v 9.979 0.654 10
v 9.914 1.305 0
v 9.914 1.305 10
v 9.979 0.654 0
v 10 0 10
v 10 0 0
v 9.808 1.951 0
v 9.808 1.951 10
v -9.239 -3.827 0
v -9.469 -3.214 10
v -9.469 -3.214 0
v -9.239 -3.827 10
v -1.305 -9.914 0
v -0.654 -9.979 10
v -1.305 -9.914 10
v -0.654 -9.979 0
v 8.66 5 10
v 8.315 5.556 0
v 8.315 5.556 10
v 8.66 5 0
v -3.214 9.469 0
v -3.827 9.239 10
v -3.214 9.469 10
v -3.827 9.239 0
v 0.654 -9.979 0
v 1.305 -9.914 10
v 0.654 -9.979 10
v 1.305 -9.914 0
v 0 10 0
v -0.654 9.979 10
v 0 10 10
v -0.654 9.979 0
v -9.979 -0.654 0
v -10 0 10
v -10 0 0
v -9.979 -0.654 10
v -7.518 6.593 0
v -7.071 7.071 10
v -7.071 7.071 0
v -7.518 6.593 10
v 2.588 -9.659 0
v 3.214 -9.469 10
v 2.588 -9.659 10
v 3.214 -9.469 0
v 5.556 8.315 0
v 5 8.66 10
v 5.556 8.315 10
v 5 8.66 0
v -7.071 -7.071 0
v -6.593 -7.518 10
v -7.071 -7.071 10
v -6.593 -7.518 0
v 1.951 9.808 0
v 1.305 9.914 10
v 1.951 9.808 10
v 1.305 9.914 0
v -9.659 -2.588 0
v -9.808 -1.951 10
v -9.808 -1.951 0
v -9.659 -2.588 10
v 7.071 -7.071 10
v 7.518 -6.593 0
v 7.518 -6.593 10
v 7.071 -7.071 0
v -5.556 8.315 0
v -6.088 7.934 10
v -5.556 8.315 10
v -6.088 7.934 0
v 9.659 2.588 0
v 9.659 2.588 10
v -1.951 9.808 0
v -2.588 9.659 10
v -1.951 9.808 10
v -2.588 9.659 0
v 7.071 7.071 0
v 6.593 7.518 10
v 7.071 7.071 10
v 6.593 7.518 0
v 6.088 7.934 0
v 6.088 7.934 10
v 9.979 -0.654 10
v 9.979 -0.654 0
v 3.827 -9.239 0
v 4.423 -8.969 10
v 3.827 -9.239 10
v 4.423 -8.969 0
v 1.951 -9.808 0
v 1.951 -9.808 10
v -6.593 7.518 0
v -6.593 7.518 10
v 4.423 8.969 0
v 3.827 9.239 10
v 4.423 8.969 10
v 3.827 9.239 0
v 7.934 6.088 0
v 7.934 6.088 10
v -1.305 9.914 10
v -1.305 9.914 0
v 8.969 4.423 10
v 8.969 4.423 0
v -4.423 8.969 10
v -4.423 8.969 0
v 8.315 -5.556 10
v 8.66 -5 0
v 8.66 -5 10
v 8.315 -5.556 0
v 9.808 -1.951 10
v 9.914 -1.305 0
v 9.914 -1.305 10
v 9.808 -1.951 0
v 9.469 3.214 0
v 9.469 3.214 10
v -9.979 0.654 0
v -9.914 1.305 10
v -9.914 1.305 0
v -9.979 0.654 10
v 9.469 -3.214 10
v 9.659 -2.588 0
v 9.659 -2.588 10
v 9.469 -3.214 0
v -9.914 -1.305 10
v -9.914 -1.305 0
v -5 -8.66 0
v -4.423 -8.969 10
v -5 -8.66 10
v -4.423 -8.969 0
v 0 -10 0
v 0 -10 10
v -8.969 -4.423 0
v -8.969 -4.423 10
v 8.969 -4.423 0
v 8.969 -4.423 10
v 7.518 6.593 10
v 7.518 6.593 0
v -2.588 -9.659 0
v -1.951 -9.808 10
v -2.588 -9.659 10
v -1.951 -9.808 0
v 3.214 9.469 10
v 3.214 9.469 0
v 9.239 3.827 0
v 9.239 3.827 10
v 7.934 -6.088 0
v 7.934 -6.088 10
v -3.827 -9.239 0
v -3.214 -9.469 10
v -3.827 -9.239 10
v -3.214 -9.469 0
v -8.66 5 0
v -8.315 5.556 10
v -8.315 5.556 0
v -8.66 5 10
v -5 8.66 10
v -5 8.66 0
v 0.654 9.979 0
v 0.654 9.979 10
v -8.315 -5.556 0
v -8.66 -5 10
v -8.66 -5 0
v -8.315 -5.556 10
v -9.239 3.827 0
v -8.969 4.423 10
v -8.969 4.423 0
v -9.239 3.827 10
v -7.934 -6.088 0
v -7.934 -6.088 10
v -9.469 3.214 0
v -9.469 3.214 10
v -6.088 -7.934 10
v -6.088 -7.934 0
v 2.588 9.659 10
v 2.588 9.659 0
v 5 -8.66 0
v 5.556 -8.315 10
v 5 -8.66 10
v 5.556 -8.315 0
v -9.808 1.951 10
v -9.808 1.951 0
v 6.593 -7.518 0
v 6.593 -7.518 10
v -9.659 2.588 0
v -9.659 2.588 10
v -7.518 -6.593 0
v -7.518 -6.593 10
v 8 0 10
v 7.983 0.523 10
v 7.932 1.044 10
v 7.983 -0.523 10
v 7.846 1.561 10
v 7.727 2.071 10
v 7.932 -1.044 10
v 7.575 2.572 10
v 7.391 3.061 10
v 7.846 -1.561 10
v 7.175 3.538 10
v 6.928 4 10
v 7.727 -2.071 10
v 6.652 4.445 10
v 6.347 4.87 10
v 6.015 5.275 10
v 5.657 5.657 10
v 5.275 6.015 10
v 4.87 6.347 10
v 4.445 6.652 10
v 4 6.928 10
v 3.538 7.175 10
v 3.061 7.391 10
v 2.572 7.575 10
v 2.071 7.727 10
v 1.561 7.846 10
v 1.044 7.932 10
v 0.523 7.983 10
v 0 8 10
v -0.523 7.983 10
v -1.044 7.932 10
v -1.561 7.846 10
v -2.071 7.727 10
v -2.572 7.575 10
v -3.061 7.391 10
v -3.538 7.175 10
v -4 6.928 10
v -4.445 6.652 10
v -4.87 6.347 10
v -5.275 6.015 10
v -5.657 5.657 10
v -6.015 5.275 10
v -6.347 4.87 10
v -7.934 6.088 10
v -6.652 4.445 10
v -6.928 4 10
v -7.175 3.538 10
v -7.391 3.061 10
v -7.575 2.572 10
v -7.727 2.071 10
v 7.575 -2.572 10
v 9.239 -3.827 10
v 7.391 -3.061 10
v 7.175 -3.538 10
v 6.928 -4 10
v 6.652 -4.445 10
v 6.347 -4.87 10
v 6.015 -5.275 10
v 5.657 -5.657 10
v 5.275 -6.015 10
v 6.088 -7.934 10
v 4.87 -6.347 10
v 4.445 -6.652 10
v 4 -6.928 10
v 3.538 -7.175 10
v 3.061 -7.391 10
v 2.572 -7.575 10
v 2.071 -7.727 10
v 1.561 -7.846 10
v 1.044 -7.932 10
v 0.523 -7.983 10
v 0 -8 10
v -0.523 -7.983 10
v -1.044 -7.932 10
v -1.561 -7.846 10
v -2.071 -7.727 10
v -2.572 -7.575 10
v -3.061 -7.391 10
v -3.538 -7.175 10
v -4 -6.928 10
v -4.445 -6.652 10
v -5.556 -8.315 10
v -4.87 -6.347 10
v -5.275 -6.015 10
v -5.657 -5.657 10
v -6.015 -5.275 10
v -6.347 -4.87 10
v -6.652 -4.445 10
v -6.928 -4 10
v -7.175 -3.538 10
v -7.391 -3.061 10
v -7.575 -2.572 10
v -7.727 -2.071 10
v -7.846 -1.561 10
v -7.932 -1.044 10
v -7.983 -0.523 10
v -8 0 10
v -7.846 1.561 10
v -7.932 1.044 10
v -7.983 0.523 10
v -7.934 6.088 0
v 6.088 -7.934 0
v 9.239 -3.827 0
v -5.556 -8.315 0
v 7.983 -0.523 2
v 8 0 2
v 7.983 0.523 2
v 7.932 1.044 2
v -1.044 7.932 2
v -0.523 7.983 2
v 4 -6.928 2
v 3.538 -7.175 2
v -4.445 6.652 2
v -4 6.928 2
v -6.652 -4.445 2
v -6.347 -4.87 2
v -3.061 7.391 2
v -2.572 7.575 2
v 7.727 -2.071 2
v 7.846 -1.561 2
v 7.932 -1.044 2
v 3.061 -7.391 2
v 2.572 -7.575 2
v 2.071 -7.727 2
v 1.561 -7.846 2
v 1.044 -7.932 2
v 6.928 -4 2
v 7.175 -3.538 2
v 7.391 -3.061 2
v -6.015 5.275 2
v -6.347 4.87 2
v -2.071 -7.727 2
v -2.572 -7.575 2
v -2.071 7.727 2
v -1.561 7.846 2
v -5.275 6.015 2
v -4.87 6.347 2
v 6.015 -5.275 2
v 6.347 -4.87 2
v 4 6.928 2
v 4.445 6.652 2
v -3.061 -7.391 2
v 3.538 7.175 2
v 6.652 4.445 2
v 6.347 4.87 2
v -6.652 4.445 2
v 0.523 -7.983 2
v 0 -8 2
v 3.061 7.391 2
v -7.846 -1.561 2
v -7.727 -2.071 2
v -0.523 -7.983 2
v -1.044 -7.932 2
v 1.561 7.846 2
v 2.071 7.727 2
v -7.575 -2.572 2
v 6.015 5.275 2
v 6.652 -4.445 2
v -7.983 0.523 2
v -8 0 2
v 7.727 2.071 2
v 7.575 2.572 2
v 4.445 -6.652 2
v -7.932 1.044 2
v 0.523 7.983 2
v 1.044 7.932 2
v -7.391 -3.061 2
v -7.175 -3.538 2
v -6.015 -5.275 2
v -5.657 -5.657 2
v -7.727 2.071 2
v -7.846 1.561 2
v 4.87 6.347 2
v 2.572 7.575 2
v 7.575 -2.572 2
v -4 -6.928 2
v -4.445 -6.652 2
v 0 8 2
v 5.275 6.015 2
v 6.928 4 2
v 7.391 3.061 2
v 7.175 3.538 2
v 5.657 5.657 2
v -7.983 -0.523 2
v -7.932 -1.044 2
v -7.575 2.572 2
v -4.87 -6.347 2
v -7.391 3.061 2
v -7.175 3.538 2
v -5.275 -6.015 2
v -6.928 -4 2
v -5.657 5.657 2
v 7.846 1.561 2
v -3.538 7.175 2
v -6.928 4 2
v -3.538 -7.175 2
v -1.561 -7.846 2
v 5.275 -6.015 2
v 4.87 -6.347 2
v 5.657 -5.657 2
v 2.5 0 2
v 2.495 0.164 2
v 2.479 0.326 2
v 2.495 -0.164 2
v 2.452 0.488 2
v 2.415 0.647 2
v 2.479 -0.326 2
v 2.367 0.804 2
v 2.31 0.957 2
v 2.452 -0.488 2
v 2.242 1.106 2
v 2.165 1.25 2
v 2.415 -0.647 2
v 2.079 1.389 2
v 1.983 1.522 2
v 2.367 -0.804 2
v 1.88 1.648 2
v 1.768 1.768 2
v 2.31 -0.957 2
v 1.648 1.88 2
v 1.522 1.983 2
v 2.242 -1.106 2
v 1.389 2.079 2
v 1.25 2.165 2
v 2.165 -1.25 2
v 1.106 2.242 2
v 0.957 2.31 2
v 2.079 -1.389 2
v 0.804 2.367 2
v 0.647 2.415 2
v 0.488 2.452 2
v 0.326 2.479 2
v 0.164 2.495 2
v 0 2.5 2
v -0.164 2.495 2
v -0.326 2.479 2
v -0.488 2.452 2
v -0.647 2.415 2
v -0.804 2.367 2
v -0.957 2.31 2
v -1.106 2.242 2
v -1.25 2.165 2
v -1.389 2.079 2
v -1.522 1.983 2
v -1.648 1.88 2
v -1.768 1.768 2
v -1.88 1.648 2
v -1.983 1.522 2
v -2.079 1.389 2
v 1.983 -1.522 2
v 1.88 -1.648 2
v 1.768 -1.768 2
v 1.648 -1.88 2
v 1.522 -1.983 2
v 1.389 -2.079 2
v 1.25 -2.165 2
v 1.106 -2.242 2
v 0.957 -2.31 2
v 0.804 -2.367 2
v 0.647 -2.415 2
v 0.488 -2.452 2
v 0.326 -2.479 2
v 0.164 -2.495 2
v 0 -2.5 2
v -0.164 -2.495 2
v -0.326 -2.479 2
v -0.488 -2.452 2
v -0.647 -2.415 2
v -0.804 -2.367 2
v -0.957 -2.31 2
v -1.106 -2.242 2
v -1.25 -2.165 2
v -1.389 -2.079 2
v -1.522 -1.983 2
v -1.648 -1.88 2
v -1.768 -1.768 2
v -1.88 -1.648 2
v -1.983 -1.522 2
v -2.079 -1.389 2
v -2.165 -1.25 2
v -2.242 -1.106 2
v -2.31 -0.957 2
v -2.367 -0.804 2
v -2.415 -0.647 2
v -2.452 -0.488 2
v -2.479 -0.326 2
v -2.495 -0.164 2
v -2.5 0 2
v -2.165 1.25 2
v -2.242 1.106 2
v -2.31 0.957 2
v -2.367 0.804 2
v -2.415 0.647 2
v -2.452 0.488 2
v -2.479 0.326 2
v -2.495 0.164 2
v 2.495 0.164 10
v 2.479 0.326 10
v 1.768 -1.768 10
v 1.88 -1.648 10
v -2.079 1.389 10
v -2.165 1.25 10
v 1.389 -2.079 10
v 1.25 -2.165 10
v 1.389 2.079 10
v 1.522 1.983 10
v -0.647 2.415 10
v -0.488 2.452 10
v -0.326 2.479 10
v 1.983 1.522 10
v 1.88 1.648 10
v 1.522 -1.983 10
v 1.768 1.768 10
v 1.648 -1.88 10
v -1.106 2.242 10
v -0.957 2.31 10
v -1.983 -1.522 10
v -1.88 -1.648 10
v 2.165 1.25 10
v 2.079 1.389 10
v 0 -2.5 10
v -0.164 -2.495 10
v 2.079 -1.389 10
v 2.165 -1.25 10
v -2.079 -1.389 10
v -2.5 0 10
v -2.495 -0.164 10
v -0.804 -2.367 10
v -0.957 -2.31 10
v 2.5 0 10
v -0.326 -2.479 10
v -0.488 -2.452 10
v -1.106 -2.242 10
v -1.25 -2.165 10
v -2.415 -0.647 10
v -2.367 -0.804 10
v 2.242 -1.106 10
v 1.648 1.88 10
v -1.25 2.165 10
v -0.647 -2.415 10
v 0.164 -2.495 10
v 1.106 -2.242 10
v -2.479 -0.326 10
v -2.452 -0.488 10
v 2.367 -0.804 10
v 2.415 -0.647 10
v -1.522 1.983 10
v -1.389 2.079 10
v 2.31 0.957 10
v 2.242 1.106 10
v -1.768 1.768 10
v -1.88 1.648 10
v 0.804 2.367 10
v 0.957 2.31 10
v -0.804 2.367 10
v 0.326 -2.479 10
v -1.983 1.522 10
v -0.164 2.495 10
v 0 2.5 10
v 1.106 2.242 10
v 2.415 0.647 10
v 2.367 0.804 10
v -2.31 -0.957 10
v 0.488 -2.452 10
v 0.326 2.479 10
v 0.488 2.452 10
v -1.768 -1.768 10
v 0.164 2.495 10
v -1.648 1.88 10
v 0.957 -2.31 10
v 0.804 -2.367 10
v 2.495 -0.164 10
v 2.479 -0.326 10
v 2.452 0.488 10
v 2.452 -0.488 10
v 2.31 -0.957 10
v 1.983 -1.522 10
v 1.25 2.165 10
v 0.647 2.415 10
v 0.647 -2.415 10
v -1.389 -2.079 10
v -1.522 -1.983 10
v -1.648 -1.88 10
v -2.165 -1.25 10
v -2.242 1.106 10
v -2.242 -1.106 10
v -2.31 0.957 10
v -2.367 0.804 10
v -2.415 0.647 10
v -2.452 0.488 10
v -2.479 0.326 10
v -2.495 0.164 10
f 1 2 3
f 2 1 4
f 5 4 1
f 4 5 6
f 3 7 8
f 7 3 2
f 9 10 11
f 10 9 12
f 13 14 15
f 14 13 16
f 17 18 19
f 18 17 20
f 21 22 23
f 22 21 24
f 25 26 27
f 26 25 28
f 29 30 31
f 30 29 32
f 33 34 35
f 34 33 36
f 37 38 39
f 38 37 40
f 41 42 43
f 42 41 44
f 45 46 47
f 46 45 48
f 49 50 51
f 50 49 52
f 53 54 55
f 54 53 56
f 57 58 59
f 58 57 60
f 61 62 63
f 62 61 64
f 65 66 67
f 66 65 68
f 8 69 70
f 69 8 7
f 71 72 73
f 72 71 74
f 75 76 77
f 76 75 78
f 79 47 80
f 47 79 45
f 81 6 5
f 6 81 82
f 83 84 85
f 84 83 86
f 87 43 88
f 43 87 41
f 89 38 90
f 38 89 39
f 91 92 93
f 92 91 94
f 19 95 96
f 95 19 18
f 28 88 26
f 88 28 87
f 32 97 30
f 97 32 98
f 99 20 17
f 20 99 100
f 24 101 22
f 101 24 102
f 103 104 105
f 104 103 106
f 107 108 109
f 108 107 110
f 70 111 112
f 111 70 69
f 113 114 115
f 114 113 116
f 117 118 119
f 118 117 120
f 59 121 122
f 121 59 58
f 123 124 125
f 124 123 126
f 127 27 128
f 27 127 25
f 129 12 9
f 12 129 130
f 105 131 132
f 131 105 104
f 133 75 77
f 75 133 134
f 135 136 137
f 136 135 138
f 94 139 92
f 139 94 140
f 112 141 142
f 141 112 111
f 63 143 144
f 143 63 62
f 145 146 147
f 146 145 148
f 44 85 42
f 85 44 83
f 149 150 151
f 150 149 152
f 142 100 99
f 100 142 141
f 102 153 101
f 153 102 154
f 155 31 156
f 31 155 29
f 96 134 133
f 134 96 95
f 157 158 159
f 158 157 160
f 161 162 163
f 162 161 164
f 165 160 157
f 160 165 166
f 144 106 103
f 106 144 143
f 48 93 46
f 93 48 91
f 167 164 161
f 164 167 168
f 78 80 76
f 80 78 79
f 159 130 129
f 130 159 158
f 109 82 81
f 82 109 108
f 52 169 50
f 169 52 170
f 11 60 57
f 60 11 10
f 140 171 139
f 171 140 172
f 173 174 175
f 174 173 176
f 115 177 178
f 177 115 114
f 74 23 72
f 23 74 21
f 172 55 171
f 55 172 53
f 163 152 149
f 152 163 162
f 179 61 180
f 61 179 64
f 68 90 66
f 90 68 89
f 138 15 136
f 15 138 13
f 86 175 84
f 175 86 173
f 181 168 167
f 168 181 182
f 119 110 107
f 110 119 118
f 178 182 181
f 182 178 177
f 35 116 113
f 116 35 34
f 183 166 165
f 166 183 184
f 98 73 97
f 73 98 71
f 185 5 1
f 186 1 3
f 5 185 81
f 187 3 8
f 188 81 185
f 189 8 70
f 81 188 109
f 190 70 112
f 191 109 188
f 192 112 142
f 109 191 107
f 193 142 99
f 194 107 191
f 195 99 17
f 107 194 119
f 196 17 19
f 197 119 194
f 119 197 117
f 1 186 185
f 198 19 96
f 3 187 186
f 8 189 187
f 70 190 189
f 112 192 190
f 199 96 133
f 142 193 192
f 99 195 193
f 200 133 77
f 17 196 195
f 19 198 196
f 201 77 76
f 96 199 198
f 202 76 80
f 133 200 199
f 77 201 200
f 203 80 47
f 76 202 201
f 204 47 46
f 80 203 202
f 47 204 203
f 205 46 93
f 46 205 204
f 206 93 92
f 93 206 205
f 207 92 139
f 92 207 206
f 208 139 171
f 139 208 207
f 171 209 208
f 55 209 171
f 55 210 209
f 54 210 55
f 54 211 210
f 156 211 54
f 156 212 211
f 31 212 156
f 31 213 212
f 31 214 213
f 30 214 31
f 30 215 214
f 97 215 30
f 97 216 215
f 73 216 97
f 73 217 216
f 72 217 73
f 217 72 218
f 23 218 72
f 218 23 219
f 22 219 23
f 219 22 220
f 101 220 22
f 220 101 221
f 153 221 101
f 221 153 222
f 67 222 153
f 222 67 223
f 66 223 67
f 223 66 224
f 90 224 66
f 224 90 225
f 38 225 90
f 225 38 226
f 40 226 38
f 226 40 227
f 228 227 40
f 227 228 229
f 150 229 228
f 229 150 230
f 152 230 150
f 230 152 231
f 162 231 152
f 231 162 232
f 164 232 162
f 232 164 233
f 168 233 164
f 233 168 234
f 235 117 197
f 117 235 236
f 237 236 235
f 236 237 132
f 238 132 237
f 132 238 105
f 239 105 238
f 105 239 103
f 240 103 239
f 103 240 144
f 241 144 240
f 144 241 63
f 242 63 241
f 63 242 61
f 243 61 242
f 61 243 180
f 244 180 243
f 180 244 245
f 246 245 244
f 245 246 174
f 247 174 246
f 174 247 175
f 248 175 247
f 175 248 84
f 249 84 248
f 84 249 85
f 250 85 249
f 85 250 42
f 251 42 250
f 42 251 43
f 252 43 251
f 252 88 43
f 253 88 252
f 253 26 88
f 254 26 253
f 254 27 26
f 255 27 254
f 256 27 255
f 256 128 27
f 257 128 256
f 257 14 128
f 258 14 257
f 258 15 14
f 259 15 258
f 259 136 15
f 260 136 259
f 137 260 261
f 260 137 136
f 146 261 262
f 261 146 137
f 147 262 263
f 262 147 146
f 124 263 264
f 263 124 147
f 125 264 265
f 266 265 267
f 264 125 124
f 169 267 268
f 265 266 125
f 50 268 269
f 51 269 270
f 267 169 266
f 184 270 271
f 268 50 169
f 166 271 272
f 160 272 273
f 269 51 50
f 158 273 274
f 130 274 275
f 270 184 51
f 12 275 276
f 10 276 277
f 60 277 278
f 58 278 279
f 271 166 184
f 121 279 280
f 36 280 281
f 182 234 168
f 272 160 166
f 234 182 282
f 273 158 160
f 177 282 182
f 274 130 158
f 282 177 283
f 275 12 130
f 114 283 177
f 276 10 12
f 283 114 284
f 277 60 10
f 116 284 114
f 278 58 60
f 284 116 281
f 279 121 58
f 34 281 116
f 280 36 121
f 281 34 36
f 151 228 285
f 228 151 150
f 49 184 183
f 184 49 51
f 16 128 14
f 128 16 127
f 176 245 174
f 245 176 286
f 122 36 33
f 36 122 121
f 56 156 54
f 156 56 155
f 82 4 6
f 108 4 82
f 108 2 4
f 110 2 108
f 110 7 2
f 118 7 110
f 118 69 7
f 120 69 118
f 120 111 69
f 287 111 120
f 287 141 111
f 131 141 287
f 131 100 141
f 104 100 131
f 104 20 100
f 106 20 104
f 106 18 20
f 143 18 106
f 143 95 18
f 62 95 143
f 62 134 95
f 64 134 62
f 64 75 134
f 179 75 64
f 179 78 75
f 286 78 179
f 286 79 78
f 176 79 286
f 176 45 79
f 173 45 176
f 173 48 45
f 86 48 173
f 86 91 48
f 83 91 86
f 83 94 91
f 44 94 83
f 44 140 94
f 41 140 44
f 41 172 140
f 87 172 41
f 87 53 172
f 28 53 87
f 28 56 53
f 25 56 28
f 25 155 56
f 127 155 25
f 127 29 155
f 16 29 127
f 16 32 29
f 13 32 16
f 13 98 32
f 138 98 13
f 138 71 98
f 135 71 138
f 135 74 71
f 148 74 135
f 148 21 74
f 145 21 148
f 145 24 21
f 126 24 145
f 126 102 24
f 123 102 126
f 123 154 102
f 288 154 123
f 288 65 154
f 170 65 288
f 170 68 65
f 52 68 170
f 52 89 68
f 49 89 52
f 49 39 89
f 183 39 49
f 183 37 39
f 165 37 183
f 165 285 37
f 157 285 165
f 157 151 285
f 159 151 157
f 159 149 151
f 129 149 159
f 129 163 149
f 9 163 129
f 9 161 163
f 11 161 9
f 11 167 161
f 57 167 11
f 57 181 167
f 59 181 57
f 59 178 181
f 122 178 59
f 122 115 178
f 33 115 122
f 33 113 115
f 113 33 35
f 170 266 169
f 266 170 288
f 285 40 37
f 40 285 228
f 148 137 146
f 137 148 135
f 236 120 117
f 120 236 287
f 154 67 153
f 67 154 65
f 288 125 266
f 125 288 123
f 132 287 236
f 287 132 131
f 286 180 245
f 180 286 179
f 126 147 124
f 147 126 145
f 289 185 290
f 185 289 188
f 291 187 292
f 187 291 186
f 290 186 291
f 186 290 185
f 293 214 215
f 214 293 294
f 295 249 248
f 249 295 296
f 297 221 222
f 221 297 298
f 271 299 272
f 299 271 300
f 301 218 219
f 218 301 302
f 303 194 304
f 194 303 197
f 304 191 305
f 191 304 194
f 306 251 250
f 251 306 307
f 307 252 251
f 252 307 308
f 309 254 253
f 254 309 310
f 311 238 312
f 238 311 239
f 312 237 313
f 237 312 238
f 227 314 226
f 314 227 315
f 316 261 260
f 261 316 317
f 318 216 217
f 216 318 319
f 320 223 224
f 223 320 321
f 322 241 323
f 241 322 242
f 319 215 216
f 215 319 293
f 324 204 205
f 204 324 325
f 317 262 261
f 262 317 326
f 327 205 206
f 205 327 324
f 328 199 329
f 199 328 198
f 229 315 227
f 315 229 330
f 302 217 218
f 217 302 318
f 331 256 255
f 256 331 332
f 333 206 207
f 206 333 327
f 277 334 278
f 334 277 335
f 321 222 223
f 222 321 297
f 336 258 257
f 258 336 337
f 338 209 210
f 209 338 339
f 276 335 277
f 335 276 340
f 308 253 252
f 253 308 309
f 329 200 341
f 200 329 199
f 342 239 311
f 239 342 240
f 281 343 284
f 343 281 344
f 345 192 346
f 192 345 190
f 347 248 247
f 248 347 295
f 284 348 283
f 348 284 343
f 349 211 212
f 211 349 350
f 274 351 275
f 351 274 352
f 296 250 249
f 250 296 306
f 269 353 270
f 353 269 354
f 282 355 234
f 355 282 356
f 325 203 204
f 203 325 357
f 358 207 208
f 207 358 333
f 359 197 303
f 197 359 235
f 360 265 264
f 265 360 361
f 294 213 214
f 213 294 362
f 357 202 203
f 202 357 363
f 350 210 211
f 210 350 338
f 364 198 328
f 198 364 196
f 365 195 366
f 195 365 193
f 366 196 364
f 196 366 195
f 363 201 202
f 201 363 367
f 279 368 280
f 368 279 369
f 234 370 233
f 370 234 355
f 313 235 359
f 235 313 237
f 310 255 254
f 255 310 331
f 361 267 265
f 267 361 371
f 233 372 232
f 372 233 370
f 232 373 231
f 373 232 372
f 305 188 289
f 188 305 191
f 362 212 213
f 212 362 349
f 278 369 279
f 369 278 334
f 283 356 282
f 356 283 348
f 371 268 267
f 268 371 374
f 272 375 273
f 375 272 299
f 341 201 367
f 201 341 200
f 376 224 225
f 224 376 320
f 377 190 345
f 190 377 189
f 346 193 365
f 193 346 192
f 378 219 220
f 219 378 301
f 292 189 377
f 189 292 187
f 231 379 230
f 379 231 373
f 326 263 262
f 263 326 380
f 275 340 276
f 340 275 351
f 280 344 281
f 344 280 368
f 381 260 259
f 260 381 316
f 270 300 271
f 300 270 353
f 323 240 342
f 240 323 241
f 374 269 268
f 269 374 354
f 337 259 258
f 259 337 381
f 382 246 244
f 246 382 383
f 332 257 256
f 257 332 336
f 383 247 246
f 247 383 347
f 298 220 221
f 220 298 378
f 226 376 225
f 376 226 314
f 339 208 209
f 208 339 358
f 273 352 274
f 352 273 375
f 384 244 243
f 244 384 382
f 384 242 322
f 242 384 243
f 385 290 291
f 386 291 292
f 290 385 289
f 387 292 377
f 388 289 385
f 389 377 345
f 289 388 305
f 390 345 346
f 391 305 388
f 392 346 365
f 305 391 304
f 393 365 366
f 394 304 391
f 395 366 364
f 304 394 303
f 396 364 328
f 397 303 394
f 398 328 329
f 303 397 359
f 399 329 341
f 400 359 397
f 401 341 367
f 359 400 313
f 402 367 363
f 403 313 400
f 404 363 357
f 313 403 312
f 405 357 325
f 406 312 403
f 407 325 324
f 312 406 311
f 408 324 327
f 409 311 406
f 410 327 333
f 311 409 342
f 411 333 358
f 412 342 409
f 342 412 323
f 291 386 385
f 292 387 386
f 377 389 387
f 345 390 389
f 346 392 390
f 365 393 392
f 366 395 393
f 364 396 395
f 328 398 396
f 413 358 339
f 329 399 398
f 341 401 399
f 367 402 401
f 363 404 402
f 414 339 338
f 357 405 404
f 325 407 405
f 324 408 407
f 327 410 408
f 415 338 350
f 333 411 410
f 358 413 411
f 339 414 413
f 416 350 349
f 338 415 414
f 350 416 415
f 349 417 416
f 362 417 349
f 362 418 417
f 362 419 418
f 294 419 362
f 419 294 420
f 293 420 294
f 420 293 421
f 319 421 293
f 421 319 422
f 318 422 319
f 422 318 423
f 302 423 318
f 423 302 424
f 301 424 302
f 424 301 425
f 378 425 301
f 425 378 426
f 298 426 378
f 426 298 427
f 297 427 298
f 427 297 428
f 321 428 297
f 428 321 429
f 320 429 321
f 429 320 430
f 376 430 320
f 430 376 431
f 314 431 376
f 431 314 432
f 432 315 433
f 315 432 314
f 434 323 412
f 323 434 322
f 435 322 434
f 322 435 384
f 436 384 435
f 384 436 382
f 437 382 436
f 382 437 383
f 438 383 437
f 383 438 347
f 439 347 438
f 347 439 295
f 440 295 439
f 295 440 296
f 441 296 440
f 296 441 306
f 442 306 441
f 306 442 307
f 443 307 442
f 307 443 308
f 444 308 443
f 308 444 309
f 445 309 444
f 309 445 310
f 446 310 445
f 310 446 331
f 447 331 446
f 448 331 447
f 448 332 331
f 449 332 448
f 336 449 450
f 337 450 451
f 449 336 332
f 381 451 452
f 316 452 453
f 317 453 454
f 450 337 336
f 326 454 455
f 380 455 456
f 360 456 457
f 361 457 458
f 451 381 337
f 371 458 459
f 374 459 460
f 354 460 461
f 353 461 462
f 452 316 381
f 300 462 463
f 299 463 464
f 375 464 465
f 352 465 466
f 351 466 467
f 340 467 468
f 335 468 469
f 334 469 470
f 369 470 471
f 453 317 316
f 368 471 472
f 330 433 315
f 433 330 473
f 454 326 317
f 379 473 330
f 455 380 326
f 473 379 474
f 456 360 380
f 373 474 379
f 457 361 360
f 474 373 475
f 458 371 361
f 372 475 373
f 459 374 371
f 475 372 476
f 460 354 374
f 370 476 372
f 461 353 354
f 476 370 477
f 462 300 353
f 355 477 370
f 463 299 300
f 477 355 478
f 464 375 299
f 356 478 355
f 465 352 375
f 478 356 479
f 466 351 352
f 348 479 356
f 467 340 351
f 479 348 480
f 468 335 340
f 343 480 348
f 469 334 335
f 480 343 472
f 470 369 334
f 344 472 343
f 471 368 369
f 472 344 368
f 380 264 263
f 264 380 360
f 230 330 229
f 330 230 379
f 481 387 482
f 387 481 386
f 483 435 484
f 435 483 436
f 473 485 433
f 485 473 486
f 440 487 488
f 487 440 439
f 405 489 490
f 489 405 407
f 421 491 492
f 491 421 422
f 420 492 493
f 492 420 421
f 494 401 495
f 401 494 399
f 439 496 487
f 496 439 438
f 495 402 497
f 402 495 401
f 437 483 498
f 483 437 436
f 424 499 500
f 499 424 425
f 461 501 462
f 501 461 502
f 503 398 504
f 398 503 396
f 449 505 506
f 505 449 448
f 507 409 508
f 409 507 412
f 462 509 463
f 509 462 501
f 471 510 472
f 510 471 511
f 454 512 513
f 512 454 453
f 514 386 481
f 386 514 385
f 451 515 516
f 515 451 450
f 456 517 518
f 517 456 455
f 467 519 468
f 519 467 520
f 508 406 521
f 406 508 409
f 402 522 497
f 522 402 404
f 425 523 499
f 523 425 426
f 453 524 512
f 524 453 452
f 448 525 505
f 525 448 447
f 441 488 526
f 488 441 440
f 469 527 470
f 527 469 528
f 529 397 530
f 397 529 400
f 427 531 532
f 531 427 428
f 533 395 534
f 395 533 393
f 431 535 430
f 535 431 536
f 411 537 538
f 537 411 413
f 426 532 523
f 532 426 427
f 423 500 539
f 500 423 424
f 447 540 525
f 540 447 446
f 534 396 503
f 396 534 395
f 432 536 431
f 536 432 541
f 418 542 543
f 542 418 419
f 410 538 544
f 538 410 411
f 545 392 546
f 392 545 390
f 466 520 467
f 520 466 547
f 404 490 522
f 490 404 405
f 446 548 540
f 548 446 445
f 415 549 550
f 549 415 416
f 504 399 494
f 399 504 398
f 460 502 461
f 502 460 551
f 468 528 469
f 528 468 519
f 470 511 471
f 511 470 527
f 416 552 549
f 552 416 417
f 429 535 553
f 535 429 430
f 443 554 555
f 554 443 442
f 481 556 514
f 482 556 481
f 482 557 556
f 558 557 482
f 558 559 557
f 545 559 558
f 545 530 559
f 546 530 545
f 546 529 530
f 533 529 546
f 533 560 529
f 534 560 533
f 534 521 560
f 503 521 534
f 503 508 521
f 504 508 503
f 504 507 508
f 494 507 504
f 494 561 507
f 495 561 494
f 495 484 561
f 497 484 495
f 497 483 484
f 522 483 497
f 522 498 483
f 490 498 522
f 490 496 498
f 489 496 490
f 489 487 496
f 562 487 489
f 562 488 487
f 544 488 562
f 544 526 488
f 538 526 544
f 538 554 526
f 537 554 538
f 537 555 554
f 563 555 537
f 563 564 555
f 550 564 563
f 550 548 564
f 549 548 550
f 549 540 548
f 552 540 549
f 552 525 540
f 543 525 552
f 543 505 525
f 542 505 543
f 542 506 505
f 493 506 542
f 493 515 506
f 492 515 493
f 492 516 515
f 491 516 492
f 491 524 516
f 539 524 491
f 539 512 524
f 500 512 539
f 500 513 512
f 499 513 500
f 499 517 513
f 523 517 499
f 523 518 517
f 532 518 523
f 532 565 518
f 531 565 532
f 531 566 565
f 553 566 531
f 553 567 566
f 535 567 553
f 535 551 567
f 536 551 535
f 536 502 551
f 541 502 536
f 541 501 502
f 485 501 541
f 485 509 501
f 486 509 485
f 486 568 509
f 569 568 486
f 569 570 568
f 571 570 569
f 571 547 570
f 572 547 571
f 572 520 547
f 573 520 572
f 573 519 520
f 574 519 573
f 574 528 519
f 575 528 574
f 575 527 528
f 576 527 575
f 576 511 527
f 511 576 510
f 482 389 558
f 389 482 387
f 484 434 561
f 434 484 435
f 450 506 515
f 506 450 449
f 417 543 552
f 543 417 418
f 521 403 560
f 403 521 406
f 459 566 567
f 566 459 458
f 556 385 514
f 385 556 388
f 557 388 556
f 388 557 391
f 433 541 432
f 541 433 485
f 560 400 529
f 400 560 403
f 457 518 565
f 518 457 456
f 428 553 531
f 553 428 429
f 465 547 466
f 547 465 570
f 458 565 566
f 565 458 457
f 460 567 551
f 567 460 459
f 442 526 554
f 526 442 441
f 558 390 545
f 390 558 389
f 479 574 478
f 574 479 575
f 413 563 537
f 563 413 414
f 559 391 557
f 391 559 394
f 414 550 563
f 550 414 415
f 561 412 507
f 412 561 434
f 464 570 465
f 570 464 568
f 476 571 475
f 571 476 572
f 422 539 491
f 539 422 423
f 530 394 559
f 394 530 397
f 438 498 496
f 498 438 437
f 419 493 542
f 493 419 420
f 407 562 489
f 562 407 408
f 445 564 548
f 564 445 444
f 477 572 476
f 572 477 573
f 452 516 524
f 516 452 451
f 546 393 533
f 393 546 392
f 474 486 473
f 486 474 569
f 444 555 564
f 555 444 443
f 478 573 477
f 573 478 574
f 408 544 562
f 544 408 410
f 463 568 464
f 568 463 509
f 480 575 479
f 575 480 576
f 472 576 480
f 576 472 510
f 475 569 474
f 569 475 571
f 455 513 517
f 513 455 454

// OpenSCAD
// analyze_tests.scad — fixtures with KNOWN dimensions to gate tools/analyze.py.
// Each module is a single solid; analyze should recover the dims in the comments.
$fn = 96;

// Plate 40x30x6 with a Ø8 hole right through.
module through_hole() difference() {
    translate([-20, -15, 0]) cube([40, 30, 6]);
    translate([0, 0, -1]) cylinder(d = 8, h = 8);
}

// Same plate: Ø8 through + Ø16 counterbore in the top 3 mm.
module counterbore() difference() {
    translate([-20, -15, 0]) cube([40, 30, 6]);
    translate([0, 0, -1]) cylinder(d = 8, h = 8);
    translate([0, 0, 3]) cylinder(d = 16, h = 4);
}

// Plate with a Ø6 BLIND hole 4 mm deep from the top (z 2..6).
module blind_hole() difference() {
    translate([-20, -15, 0]) cube([40, 30, 6]);
    translate([0, 0, 2]) cylinder(d = 6, h = 5);
}

// Plate with a Ø6 blind hole whose mouth is at z = 2.4 (OFF the 1 mm grid) — to gate
// the fine refinement: a coarse 1 mm sweep brackets it at z2..3, refine pins z≈2.4.
module blind_offgrid() difference() {
    translate([-20, -15, 0]) cube([40, 30, 6]);
    translate([0, 0, 2.4]) cylinder(d = 6, h = 5);
}

// Cup (Ø20, h10) with a Ø16 cavity from the top and a central Ø5 post (a STANDOFF
// that stands z 2..10 inside the cavity → an island in the slices).
module standoff() {
    difference() {
        cylinder(d = 20, h = 10);
        translate([0, 0, 2]) cylinder(d = 16, h = 9);
    }
    translate([0, 0, 2]) cylinder(d = 5, h = 8);
}

// Walled box 40x30x10, cavity 36x26 open at the top, floor 2 mm -> walls 2 mm all round.
module walled_box() difference() {
    translate([-20, -15, 0]) cube([40, 30, 10]);
    translate([-18, -13, 2]) cube([36, 26, 9]);
}

// Same box but the cavity widens in the upper band (z 6..10): walls 2 mm (z2..6) ->
// 1 mm (z6..10) — a recess in the wall, seen as two stacked cavities of different size.
module recess_box() difference() {
    translate([-20, -15, 0]) cube([40, 30, 10]);
    translate([-18, -13, 2]) cube([36, 26, 9]);
    translate([-19, -14, 6]) cube([38, 28, 5]);
}

// ---------- Self-preview (top-level; `use <...>` ignores it) ----------
standoff();
